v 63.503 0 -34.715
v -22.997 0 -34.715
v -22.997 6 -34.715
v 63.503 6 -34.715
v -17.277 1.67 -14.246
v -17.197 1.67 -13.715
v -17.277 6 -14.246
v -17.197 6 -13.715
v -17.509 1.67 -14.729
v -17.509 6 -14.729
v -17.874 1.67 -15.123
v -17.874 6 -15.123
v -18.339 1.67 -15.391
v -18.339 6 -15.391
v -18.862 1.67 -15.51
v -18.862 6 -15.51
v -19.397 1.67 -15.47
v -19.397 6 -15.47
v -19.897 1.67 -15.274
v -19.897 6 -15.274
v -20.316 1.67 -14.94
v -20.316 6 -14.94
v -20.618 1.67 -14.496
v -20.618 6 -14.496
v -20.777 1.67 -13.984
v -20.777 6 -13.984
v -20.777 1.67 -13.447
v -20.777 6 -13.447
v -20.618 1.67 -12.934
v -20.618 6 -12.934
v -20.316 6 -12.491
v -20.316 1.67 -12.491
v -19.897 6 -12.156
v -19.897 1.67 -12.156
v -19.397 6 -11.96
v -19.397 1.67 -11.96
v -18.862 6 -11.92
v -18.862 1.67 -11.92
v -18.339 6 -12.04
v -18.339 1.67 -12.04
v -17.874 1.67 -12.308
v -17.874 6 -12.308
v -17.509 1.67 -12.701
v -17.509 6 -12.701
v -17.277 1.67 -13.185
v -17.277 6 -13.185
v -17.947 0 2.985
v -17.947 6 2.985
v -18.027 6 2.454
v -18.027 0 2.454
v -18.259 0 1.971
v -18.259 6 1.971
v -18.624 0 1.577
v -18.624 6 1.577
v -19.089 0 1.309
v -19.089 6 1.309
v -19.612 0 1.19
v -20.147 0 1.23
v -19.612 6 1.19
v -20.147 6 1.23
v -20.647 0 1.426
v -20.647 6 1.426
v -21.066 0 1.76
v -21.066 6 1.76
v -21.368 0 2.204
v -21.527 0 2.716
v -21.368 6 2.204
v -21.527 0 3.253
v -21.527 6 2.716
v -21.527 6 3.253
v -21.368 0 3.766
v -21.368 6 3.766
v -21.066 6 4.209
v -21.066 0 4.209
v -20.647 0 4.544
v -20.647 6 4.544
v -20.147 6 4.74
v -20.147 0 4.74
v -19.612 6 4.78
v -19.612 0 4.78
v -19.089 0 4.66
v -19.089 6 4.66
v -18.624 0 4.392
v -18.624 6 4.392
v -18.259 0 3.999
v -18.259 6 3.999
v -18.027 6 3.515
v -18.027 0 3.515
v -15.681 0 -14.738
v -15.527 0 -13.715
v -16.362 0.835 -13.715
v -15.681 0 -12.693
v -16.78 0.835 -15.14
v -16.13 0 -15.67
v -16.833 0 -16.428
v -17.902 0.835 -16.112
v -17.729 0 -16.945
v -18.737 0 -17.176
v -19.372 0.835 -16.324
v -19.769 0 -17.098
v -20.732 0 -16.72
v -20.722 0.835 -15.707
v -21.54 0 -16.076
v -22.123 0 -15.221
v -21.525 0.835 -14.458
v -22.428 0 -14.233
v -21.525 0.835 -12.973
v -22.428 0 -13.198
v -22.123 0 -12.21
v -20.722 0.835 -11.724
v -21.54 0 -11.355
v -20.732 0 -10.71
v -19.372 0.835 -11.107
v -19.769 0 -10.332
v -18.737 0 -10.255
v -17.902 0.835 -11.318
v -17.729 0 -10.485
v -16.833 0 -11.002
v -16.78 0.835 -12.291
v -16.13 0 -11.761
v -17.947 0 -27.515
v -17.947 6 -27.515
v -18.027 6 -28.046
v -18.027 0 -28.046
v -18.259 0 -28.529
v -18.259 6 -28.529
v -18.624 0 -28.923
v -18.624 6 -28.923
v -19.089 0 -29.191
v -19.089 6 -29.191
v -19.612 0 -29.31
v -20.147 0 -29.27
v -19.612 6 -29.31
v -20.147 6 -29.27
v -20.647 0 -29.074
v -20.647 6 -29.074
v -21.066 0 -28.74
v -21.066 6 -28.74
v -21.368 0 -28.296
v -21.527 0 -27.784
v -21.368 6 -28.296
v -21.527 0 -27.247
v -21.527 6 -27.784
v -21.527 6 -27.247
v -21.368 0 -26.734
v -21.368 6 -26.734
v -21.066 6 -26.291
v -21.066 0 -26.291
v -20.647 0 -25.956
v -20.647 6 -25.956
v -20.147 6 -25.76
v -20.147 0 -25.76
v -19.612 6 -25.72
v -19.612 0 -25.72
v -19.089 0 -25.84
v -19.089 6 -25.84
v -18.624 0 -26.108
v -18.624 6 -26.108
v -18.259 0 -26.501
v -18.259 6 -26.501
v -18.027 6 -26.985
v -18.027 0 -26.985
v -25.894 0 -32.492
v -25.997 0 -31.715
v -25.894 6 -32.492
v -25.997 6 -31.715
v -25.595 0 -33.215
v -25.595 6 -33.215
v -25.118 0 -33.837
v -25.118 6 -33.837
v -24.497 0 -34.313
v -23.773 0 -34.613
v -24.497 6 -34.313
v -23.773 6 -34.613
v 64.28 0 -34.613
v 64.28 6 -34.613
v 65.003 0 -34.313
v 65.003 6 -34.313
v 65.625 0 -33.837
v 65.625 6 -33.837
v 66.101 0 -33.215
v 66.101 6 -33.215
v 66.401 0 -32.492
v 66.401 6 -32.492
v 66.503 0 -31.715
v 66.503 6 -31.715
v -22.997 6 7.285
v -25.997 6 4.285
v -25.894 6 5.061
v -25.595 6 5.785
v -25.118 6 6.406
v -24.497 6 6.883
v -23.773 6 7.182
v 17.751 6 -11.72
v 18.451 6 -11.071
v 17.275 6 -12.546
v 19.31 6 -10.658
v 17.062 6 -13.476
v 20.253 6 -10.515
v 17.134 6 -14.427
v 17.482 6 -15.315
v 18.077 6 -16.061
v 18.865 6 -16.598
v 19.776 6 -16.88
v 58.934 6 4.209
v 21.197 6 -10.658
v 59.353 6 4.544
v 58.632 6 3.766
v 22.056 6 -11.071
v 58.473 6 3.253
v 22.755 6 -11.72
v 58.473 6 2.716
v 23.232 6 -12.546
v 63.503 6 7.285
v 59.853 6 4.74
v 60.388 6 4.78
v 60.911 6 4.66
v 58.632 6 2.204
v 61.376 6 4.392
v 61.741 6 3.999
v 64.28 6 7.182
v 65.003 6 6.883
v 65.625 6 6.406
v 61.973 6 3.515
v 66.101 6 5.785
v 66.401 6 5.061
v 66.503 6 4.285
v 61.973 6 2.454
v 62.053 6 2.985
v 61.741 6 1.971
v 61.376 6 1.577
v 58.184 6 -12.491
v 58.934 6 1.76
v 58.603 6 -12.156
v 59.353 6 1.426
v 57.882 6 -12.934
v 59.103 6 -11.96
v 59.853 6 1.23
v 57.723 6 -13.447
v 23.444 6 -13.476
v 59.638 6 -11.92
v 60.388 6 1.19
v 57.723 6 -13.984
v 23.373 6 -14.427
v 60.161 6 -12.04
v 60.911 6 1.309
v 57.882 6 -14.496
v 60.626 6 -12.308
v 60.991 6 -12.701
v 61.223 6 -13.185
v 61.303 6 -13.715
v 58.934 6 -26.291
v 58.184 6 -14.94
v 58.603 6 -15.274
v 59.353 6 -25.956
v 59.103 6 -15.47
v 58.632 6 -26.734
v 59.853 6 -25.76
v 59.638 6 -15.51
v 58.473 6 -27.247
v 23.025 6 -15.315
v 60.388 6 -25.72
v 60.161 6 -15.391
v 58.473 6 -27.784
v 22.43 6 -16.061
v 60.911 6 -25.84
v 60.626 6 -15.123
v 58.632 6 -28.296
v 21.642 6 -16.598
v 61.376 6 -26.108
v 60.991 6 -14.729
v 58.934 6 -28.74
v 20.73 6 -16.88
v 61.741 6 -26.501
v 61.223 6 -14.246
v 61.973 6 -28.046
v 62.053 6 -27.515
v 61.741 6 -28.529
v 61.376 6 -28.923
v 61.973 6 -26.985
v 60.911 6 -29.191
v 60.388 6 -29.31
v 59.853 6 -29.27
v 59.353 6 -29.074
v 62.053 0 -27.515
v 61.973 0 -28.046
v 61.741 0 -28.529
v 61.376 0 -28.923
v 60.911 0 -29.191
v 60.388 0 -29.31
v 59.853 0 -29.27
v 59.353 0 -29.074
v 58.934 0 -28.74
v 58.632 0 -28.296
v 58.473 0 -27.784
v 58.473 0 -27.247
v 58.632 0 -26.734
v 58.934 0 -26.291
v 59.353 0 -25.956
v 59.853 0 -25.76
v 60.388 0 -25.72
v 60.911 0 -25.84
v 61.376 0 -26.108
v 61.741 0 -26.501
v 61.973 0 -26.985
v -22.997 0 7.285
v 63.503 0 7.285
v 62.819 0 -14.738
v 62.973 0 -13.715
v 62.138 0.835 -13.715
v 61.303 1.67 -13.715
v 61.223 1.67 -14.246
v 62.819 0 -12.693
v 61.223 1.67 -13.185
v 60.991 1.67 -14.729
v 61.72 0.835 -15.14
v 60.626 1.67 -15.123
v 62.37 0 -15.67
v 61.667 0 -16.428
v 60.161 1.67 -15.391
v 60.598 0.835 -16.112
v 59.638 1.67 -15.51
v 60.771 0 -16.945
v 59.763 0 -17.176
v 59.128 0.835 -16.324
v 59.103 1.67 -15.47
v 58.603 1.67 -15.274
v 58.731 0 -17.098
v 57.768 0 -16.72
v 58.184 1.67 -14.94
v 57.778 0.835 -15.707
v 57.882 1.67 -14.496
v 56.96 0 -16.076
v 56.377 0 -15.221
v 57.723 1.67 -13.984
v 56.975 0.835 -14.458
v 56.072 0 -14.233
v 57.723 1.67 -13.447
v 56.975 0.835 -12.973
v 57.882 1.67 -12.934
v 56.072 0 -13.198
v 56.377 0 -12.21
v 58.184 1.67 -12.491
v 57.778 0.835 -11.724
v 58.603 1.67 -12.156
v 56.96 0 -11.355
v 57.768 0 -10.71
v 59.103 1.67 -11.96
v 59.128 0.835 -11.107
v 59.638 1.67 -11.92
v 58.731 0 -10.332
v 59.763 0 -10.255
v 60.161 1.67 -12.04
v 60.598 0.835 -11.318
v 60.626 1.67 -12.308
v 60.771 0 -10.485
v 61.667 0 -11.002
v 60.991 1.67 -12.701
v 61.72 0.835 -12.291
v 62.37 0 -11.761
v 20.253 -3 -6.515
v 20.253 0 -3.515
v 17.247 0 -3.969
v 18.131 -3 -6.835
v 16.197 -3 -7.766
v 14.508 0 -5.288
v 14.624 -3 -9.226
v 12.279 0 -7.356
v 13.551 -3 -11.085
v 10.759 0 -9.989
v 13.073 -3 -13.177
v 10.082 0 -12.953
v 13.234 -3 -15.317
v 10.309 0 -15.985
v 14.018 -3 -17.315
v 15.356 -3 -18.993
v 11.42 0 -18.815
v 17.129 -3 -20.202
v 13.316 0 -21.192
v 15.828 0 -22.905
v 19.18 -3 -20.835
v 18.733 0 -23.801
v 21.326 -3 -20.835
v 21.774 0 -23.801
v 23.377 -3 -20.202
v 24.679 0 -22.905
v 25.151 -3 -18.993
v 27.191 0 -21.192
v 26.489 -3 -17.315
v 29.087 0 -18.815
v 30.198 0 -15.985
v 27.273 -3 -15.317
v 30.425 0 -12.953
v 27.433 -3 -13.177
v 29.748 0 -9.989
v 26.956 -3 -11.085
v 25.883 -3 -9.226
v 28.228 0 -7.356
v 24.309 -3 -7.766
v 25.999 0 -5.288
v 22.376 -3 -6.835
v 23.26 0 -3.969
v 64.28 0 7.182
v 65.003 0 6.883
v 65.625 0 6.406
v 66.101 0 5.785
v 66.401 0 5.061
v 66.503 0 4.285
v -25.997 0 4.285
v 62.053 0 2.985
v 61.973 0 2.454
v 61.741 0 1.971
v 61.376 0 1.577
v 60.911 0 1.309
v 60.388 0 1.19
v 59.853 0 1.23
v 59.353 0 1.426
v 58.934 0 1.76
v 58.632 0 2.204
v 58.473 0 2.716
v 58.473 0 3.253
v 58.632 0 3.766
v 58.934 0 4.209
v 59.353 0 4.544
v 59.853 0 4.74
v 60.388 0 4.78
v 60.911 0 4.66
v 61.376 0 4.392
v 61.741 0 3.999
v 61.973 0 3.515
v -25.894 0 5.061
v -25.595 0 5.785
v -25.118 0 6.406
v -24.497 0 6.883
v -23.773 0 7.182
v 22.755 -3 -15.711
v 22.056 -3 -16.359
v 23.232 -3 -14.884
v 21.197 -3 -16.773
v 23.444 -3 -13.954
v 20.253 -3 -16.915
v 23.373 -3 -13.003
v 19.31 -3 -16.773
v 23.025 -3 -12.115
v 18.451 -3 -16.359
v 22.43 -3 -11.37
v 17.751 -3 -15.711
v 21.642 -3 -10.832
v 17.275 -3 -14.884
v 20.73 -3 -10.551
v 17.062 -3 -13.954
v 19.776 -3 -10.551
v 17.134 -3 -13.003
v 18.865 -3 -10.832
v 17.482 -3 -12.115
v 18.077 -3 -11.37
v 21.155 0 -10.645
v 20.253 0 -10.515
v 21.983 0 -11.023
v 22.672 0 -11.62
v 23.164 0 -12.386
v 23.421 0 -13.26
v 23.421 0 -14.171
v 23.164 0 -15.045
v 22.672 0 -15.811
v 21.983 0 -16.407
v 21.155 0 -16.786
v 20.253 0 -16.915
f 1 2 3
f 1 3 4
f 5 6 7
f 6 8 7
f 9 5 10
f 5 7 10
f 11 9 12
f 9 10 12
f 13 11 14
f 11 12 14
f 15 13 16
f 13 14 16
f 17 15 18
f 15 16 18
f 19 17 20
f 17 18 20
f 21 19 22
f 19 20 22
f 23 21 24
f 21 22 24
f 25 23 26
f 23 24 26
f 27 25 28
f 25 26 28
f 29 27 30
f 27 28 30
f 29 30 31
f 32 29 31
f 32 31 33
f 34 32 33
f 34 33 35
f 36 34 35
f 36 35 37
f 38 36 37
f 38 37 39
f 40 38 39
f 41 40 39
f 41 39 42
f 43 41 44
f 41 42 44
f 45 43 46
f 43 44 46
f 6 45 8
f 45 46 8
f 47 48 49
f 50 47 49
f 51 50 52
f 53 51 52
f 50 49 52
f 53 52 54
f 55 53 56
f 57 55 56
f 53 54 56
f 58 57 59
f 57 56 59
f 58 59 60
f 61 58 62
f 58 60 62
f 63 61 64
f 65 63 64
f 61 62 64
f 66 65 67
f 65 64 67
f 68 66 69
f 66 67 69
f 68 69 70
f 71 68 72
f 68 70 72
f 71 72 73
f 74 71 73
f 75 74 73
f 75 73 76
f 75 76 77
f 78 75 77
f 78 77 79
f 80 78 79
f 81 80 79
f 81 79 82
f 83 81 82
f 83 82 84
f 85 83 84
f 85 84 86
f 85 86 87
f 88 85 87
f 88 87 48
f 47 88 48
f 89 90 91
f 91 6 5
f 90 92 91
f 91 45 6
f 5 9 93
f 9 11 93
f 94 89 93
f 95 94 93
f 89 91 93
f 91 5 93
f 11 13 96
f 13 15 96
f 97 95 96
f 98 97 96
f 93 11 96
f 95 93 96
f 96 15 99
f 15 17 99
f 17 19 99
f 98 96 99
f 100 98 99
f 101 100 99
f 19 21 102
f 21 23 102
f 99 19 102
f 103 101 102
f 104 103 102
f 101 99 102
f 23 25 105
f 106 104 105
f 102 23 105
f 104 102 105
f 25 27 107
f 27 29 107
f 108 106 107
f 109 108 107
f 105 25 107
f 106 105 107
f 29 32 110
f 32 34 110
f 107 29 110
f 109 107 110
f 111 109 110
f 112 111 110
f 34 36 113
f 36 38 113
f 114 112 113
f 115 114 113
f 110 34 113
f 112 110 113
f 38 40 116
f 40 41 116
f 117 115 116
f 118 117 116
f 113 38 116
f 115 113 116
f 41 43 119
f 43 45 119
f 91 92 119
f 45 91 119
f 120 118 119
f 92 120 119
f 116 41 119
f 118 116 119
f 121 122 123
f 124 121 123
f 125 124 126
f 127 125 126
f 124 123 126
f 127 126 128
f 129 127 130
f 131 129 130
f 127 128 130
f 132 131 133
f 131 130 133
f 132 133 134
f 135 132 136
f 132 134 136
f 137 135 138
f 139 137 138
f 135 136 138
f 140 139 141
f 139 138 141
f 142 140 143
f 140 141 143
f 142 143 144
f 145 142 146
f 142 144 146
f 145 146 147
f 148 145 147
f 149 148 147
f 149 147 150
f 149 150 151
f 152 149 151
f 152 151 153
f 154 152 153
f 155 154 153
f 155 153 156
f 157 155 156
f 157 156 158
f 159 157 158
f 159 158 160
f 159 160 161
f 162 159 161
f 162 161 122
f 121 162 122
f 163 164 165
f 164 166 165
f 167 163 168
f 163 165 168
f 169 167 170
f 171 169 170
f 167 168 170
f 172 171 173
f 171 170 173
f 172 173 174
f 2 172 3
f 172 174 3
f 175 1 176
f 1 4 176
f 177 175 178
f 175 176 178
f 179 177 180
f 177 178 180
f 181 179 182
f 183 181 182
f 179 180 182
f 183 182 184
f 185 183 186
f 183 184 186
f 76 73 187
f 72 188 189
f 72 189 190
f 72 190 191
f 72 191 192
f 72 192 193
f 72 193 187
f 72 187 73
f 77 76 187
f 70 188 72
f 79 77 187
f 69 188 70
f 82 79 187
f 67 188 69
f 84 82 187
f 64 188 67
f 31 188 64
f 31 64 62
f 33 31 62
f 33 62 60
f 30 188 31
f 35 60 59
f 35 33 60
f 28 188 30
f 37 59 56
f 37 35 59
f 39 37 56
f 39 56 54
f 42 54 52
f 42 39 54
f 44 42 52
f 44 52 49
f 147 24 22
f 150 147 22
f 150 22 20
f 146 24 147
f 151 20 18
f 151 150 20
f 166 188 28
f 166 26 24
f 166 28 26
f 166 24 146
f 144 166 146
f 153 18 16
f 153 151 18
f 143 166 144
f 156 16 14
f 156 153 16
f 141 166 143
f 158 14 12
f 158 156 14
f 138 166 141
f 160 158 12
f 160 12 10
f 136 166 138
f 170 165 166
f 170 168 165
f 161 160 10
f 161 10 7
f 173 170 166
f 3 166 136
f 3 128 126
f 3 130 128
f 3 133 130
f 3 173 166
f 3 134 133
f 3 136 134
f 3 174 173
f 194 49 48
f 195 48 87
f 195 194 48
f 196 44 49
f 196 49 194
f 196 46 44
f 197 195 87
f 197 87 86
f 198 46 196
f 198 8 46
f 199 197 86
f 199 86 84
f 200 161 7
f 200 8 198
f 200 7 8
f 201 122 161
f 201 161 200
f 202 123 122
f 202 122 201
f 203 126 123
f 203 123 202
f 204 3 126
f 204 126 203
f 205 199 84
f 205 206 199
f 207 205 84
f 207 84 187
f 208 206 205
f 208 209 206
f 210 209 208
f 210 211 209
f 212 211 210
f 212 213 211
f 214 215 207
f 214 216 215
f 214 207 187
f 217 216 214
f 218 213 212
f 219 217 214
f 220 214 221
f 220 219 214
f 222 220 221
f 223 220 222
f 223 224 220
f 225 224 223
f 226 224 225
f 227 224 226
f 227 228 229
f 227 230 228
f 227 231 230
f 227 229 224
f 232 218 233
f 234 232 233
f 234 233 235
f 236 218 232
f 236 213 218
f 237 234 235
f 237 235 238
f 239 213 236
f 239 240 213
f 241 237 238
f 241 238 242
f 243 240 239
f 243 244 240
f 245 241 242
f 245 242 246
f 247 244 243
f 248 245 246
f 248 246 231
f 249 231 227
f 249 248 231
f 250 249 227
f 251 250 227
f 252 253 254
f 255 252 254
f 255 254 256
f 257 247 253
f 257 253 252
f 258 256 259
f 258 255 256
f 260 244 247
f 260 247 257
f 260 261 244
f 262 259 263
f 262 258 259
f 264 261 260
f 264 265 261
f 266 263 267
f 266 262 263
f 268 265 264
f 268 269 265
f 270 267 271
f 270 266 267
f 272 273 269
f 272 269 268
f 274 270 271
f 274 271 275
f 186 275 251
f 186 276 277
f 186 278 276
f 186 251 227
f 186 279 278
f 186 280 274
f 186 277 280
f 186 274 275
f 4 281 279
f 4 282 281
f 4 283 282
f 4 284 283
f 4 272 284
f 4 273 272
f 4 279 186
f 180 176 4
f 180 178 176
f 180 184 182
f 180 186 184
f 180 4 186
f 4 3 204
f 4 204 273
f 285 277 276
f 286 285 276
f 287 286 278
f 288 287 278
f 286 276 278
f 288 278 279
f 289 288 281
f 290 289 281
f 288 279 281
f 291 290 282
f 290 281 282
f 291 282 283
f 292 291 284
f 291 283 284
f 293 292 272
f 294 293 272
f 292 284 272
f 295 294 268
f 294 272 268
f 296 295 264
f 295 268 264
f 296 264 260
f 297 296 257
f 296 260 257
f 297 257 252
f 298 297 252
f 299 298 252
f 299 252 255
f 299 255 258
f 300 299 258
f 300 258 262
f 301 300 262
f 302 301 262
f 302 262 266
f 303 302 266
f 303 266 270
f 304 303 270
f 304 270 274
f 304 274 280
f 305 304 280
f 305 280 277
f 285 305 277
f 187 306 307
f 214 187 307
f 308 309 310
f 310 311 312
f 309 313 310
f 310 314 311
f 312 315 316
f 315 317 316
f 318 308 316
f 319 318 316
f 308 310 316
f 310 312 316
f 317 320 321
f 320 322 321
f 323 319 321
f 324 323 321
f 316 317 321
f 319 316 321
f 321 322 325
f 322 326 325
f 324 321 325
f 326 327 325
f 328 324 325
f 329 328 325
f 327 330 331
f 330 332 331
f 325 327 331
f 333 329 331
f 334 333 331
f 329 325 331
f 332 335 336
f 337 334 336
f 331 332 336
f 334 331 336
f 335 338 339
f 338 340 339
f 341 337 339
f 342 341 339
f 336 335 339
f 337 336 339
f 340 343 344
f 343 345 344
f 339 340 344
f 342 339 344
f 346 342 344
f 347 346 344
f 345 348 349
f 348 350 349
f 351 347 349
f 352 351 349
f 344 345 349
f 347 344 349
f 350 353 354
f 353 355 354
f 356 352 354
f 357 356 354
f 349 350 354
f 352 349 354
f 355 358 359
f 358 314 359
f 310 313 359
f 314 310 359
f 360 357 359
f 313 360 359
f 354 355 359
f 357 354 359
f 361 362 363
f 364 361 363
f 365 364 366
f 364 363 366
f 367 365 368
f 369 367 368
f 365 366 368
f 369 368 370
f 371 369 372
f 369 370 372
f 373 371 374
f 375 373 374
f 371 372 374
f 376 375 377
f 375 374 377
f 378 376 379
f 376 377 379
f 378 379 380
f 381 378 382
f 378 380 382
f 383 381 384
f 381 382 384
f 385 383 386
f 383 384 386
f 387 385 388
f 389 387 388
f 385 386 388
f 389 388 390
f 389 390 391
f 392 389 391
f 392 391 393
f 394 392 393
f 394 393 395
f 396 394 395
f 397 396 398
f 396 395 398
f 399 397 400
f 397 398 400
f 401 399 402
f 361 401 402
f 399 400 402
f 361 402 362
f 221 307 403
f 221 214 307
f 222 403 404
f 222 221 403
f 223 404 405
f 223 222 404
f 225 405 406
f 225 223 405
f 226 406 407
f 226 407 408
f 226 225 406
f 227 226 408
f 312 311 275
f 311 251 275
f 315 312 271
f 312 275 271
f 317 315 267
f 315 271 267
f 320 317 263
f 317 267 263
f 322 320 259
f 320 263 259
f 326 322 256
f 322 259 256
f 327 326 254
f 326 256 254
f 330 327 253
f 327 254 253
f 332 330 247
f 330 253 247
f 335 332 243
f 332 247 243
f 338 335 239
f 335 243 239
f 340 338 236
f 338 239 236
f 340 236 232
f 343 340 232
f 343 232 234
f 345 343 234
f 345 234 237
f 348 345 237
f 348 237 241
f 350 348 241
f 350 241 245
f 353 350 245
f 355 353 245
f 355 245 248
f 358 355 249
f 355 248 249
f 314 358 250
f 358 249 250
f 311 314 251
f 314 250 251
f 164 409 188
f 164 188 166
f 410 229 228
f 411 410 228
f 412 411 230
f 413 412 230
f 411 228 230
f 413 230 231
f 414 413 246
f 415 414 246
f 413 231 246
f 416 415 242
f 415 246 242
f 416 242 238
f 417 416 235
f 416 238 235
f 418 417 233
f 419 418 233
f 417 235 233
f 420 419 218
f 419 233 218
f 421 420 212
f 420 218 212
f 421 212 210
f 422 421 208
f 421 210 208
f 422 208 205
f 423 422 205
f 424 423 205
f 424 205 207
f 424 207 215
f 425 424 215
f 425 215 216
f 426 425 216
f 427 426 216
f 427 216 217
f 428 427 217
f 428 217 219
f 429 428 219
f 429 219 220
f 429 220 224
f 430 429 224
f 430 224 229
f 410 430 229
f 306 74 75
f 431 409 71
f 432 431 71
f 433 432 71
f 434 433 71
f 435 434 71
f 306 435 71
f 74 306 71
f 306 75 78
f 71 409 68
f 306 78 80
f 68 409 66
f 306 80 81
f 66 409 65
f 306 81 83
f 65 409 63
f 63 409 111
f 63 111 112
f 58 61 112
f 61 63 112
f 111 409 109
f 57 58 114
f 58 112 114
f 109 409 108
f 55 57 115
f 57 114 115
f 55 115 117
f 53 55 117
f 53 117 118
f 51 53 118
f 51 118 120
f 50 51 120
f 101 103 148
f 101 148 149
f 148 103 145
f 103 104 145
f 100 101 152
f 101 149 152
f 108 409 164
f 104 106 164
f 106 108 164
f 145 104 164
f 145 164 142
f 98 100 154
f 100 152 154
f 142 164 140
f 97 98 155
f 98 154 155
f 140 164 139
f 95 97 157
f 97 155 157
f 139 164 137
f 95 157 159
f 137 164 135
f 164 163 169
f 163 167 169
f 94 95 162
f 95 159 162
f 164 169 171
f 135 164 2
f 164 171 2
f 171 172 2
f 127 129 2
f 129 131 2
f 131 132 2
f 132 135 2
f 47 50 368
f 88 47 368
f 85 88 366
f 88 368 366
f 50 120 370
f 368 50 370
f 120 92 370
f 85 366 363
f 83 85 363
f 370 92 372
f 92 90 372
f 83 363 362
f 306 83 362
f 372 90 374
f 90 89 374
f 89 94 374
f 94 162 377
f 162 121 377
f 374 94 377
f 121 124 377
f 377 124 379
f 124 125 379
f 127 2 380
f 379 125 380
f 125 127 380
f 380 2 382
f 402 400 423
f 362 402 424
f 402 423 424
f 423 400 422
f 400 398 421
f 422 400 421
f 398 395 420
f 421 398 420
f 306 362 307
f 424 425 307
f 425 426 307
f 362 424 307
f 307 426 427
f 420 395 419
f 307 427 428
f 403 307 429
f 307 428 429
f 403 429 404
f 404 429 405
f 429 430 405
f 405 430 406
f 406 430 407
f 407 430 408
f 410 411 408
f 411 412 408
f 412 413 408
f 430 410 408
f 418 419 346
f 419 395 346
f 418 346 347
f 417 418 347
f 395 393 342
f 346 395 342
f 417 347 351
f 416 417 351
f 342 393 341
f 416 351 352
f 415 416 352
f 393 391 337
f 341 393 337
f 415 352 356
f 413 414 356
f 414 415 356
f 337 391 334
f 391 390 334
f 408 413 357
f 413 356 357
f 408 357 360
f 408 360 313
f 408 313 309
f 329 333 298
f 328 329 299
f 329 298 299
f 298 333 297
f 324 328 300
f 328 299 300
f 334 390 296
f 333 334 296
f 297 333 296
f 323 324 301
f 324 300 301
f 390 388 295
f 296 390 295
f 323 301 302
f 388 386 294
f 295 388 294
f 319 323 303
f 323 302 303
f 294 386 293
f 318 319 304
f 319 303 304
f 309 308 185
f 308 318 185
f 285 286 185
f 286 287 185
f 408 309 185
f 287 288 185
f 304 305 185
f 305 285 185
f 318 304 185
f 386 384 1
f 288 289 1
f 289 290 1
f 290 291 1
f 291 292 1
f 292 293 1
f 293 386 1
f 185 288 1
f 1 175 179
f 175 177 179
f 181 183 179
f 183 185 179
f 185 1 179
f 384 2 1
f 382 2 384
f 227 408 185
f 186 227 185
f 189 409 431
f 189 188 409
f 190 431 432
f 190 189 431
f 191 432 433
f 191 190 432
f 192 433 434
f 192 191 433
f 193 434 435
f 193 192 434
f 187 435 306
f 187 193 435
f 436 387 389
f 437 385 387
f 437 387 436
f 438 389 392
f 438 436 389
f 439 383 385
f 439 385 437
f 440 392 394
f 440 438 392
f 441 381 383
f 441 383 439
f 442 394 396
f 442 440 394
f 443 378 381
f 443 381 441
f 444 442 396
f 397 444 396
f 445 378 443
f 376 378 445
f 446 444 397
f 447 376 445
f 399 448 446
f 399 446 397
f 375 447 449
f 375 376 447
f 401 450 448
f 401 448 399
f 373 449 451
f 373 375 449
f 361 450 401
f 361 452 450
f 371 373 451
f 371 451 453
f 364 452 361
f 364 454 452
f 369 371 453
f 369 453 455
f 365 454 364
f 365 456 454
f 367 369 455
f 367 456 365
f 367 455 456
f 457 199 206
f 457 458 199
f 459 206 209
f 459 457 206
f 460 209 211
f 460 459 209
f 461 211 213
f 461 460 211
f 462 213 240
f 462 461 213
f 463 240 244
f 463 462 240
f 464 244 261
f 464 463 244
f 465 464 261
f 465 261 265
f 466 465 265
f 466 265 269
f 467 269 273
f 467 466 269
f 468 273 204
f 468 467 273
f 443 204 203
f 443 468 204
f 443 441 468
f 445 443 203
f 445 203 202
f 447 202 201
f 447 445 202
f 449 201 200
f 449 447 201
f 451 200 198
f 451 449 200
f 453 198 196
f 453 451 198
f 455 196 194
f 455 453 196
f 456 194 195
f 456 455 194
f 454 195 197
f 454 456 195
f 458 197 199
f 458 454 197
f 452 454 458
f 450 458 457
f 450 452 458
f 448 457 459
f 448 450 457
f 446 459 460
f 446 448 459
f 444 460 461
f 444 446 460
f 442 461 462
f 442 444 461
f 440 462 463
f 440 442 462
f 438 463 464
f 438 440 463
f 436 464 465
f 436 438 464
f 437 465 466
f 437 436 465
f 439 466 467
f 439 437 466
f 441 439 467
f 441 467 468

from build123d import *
from build123d.topology import SkipClean

# Parameters (mm, degrees)
SKETCH2_W                                            = 92.5
SKETCH2_H                                            = 42
SKETCH2_R                                            = 3.2
BOSS_EXTRUDE1_DEPTH                                  = 6
M3_CLEARANCE_HOLE1_D                                 = 3.6
M3_CLEARANCE_HOLE1_DEPTH                             = 10
M3_CLEARANCE_HOLE1_TIP                               = 1.081549114
BOSS_EXTRUDE2_START                                  = 3
SKETCH7_R                                            = 7.2
SKETCH7_R_2                                          = 3.2
BOSS_EXTRUDE2_DEPTH                                  = 3
CHAMFER1_SIZE                                        = 3
FILLET1_R                                            = 3
CSK_FOR_M3_HEX_SOCKET_COUNTERSUNK_HEAD_S_D           = 3.6
CSK_FOR_M3_HEX_SOCKET_COUNTERSUNK_HEAD_S_CSINK_D     = 6.94
CSK_FOR_M3_HEX_SOCKET_COUNTERSUNK_HEAD_S_CSINK_ANGLE = 90


with BuildPart() as part:
    # Sketch2 → Boss-Extrude1 (new body)
    with BuildSketch(Plane(origin=(0, 0, 0), x_dir=(1, 0, 0), z_dir=(0, 1, 0))):
        with Locations((20.253338886, 13.715343577)):
            Rectangle(SKETCH2_W, SKETCH2_H)
        with Locations(Location((20.253338886, 13.715343577, 0), (0, 0, 270))):
            Circle(SKETCH2_R, mode=Mode.SUBTRACT)
    extrude(amount=BOSS_EXTRUDE1_DEPTH)

    # M3 Clearance Hole1
    with Locations(Plane(origin=(0, 0, 0), x_dir=(-1, 0, 0), z_dir=(0, -1, 0))):
        with Locations((-60.253338886, 27.515343577), (-60.253338886, -2.984656423), (19.746661114, -2.984656423), (19.746661114, 27.515343577)):
            Hole(M3_CLEARANCE_HOLE1_D / 2, depth=M3_CLEARANCE_HOLE1_DEPTH)
            with Locations((0, 0, -(M3_CLEARANCE_HOLE1_DEPTH + M3_CLEARANCE_HOLE1_TIP / 2))):  # 118° drill point
                Cone(0, M3_CLEARANCE_HOLE1_D / 2, M3_CLEARANCE_HOLE1_TIP, mode=Mode.SUBTRACT)

    # Sketch7 → Boss-Extrude2 (add)
    with SkipClean():  # the faces are left unmerged after this step: merging them gives an invalid solid
        with BuildSketch(Plane.XZ.offset(BOSS_EXTRUDE2_START)):
            with Locations(Location((20.253338886, -13.715343577, 0), (0, 0, 90))):
                Circle(SKETCH7_R)
            with Locations(Location((20.253338886, -13.715343577, 0), (0, 0, 270))):
                Circle(SKETCH7_R_2, mode=Mode.SUBTRACT)
        extrude(amount=-BOSS_EXTRUDE2_DEPTH)

    # Chamfer1
    chamfer1_edges = [part.edges().sort_by_distance(p)[0] for p in [
        (20.253338886, 0, -20.915343577),
    ]]
    chamfer(chamfer1_edges, length=CHAMFER1_SIZE - 0.0001)  # a hair under: the kernel refuses the full size

    # Fillet1
    fillet1_edges = [part.edges().sort_by_distance(p)[0] for p in [
        (-25.996661114, 3, -34.715343577),
        (66.503338886, 3, -34.715343577),
        (66.503338886, 3, 7.284656423),
        (-25.996661114, 3, 7.284656423),
    ]]
    fillet(fillet1_edges, radius=FILLET1_R)

    # CSK for M3 Hex Socket Countersunk Head Screw1 (through all)
    with Locations(Plane(origin=(0, 0, 0), x_dir=(-1, 0, 0), z_dir=(0, -1, 0))):
        with Locations((-59.503338886, 13.715343577), (18.996661114, 13.715343577)):
            CounterSinkHole(CSK_FOR_M3_HEX_SOCKET_COUNTERSUNK_HEAD_S_D / 2, CSK_FOR_M3_HEX_SOCKET_COUNTERSUNK_HEAD_S_CSINK_D / 2, counter_sink_angle=CSK_FOR_M3_HEX_SOCKET_COUNTERSUNK_HEAD_S_CSINK_ANGLE)


solid = part.part
